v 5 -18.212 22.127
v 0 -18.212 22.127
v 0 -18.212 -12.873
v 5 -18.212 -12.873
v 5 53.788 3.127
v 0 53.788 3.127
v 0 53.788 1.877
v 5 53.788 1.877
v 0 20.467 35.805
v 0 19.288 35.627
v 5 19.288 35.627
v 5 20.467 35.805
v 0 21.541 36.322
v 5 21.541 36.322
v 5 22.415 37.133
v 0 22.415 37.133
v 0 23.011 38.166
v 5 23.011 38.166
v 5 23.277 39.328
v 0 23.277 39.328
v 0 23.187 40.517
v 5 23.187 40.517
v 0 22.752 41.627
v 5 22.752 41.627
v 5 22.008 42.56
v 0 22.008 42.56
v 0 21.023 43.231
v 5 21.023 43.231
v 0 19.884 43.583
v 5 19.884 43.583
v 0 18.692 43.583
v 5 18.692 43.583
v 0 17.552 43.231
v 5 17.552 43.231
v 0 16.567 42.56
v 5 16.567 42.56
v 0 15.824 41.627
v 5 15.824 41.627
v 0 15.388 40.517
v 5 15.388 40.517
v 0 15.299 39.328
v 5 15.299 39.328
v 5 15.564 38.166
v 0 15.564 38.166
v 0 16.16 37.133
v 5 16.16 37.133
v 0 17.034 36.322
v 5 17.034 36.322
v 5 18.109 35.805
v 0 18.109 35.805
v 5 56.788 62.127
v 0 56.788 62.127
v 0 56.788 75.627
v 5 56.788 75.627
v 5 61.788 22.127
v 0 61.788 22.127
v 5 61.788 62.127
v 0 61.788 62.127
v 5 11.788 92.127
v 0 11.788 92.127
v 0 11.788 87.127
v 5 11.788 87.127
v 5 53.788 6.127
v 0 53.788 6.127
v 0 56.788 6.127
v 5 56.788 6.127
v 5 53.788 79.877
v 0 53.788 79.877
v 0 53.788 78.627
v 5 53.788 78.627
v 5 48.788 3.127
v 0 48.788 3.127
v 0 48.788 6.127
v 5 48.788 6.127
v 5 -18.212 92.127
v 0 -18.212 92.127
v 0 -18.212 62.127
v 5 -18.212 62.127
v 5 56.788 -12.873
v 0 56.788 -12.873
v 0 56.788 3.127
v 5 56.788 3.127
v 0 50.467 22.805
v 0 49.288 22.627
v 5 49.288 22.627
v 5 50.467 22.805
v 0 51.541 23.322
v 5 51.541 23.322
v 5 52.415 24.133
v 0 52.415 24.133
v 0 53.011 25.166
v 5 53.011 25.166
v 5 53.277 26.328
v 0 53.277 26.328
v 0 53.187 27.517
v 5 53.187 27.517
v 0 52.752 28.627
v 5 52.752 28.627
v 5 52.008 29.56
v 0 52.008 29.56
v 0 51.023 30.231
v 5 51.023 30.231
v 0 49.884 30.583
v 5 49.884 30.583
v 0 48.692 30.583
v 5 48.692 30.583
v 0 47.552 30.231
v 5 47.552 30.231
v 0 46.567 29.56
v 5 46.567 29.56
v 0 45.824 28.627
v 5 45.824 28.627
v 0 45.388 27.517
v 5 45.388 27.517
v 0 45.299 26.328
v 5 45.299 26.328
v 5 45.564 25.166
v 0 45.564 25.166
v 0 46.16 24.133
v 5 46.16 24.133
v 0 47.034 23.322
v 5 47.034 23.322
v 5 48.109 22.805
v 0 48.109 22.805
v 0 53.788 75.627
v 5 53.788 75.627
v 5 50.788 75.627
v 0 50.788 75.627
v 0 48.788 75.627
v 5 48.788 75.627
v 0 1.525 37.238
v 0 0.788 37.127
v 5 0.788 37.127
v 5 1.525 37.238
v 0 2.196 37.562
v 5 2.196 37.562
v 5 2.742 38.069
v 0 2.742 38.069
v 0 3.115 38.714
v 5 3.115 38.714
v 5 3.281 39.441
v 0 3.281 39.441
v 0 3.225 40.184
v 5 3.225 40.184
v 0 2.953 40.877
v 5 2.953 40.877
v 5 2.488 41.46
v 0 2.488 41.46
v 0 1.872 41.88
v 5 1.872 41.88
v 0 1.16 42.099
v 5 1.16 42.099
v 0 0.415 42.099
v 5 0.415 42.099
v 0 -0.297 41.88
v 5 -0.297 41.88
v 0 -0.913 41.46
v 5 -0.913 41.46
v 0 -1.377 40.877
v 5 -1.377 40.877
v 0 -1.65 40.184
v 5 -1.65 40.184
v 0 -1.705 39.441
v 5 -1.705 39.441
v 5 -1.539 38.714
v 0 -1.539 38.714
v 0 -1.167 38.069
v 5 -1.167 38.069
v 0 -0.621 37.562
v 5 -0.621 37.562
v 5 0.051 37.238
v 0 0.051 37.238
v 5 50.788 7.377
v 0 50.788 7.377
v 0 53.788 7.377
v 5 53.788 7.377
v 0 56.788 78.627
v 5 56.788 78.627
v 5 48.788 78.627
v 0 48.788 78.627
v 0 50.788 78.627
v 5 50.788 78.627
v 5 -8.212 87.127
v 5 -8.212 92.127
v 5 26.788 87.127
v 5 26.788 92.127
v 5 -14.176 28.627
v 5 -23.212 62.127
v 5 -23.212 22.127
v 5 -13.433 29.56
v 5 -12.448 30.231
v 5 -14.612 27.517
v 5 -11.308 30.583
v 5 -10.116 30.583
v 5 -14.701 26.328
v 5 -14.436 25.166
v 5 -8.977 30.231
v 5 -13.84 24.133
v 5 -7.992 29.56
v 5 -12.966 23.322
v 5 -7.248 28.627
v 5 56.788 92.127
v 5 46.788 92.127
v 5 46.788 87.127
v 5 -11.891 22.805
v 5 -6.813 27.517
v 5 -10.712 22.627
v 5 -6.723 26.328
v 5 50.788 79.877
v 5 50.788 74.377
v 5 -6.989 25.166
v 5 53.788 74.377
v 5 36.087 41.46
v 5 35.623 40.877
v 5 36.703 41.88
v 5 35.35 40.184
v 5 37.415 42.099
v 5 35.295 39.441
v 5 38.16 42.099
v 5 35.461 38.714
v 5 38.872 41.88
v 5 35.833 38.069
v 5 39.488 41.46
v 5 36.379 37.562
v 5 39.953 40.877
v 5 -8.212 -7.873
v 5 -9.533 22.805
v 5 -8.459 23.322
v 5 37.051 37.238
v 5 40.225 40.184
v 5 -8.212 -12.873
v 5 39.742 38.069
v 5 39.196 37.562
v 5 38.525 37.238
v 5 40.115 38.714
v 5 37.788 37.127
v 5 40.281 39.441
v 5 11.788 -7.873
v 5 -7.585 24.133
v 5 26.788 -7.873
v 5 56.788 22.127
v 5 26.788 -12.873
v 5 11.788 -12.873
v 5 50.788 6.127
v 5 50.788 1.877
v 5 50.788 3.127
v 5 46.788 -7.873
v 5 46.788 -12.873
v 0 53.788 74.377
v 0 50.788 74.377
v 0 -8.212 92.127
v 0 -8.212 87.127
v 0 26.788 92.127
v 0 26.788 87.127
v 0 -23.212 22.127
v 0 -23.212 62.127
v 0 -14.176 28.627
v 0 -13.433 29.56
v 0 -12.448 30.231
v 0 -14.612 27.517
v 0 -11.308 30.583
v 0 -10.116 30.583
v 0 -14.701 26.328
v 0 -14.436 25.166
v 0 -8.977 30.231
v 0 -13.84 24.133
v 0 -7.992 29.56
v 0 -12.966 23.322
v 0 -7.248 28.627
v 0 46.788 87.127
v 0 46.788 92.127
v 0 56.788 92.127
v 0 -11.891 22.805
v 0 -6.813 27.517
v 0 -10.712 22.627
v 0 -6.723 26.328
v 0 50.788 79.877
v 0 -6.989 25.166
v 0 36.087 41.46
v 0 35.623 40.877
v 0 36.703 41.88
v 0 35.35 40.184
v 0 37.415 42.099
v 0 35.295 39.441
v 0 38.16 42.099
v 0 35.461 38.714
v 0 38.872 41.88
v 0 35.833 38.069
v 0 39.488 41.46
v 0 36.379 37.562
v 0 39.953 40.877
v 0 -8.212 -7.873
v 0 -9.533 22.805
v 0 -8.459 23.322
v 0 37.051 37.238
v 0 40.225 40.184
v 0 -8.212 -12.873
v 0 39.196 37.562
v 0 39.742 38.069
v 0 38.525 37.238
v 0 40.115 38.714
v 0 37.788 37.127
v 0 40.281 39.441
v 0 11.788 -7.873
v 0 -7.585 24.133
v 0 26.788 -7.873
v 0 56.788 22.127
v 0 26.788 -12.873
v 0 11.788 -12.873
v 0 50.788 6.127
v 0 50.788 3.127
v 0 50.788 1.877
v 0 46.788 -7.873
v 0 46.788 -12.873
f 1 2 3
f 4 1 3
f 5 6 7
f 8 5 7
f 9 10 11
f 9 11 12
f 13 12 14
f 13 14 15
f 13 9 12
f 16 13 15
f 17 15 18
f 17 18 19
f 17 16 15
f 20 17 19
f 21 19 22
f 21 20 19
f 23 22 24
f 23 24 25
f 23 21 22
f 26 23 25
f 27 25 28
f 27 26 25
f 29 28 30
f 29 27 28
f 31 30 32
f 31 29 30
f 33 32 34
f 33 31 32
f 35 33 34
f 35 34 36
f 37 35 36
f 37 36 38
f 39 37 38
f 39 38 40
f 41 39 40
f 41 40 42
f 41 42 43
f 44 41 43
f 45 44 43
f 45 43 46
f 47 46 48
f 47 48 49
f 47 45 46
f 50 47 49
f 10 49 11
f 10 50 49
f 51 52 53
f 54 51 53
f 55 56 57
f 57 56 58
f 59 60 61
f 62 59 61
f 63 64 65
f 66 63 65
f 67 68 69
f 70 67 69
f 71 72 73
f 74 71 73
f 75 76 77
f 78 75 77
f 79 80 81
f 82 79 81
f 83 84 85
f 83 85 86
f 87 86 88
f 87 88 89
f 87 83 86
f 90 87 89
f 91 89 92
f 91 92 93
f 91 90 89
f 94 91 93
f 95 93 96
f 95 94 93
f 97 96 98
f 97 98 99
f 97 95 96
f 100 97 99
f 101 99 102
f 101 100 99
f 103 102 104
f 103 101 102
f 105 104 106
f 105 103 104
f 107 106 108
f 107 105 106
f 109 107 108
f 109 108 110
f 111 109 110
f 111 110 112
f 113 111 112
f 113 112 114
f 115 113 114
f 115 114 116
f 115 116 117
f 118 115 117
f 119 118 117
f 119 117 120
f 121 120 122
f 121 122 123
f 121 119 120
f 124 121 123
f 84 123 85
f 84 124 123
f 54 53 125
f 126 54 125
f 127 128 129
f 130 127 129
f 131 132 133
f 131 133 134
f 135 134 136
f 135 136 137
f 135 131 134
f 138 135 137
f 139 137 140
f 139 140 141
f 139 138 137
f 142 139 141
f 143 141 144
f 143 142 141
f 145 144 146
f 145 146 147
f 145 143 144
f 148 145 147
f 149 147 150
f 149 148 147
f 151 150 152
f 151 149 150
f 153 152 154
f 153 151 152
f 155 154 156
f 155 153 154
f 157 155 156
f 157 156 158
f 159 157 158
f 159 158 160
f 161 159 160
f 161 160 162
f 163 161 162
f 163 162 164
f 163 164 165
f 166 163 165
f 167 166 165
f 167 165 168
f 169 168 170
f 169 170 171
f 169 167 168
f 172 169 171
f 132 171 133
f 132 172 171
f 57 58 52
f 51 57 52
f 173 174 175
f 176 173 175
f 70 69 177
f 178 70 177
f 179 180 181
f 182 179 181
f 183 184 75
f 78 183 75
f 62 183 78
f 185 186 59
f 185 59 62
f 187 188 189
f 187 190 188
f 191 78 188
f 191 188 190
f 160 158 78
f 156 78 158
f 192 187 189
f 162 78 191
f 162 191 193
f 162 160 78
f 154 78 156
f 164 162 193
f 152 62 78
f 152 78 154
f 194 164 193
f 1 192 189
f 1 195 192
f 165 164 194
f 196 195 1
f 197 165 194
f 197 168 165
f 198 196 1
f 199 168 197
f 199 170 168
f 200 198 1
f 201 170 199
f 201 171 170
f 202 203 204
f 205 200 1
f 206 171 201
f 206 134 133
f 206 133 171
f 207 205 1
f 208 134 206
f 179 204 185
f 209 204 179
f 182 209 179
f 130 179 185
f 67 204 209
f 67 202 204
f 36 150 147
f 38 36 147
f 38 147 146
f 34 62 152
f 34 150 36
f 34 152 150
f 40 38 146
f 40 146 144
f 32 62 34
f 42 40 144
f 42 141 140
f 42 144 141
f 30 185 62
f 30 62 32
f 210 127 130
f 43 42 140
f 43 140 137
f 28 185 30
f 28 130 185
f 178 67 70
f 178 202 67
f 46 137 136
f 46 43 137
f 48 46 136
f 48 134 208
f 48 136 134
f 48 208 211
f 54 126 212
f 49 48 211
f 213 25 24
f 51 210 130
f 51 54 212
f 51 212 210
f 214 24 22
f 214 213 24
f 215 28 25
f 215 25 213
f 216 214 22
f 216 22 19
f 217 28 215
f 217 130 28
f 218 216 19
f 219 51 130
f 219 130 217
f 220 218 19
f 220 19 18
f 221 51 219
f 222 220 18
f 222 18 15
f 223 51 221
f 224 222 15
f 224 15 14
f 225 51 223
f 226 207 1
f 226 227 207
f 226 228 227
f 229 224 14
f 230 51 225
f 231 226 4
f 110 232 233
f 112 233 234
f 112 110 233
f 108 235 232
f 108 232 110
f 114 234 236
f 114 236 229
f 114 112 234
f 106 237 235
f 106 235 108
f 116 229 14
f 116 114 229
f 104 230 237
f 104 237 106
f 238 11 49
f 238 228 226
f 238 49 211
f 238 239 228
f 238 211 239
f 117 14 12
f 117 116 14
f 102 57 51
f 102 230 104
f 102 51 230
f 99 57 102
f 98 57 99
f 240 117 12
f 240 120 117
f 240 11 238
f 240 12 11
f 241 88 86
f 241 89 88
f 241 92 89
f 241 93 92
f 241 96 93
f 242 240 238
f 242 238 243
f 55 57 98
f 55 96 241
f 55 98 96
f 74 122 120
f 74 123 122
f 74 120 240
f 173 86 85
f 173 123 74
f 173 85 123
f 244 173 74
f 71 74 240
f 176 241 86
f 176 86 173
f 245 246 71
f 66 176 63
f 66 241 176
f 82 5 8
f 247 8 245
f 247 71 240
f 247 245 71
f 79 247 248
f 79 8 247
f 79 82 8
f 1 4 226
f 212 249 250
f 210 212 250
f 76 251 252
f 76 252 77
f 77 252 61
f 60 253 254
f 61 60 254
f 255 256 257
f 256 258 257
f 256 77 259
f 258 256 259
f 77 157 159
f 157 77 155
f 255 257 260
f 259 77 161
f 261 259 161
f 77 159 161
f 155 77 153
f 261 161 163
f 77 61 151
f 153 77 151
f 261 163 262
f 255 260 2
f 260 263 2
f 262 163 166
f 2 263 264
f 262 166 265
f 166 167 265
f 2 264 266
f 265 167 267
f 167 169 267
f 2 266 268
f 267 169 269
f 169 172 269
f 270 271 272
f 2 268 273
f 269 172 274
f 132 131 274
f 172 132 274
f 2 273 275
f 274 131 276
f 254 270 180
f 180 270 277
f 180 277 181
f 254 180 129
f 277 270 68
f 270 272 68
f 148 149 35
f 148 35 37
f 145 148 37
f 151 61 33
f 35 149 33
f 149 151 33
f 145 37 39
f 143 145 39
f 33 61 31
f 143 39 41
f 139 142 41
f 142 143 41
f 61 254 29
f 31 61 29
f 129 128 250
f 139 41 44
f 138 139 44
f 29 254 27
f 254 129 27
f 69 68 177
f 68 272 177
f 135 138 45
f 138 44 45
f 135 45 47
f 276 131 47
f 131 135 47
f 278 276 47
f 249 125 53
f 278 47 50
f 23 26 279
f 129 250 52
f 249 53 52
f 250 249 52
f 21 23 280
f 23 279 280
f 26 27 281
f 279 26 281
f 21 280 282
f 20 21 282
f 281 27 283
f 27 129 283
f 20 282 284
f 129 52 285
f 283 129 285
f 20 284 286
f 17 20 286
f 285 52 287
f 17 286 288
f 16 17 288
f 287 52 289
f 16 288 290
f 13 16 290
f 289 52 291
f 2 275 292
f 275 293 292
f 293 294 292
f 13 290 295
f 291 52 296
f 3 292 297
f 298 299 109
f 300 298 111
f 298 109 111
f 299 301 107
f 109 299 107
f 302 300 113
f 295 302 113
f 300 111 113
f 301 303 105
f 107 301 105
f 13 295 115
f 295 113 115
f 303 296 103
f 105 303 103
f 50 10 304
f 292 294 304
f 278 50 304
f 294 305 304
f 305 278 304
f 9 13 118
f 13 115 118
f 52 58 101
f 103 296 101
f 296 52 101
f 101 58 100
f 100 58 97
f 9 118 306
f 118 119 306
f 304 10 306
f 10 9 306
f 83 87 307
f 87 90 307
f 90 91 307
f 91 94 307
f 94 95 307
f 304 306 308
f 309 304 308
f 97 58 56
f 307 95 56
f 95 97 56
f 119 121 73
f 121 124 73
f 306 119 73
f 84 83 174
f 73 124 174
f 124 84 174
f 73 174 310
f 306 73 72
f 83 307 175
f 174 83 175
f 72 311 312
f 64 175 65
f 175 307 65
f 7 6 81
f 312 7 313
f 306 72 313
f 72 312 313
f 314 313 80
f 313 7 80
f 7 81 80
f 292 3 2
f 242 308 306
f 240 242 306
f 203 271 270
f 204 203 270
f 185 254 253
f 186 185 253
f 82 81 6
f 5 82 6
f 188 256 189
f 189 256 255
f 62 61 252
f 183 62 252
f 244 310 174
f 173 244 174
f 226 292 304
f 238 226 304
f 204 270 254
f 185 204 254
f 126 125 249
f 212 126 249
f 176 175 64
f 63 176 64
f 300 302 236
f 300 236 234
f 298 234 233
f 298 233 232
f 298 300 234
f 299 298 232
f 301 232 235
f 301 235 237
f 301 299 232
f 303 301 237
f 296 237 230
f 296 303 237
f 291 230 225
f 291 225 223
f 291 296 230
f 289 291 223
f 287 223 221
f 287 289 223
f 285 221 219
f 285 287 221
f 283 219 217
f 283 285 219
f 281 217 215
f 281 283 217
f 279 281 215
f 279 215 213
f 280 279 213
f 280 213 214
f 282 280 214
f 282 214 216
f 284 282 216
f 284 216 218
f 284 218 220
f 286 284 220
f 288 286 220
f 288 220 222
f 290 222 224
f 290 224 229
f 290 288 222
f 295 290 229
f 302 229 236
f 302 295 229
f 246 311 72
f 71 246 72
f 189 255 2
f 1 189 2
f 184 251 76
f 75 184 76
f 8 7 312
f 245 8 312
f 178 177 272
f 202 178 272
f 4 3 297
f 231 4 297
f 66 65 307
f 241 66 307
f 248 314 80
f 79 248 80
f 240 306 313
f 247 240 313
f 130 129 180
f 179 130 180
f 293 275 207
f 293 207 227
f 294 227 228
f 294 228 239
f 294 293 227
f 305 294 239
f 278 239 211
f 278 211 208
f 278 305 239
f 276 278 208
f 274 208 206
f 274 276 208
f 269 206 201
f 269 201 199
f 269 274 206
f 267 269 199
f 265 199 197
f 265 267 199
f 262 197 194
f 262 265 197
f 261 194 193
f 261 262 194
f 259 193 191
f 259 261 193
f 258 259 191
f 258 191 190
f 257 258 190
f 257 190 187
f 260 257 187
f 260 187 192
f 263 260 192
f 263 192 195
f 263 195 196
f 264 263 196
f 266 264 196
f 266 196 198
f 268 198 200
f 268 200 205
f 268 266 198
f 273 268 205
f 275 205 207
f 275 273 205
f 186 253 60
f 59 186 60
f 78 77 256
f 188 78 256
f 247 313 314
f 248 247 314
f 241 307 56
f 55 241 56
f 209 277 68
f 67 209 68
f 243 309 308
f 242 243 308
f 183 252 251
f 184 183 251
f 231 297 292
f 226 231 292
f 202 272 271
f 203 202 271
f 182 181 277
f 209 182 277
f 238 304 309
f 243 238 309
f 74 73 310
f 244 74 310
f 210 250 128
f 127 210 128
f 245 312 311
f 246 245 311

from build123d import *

# Parameters (mm, degrees)
SKETCH_1_R      = 4
SKETCH_1_R_2    = 2.5
EXTRUDE_1_DEPTH = 5


with BuildPart() as part:
    # 草图1 → 凸台-拉伸1 (new body)
    with BuildSketch(Plane(origin=(0, 0, 0), x_dir=(0, 0, -1), z_dir=(1, 0, 0))):
        Polygon((-62.127361451, 56.787762609), (-75.627361451, 56.787762609), (-75.627361451, 53.787762609), (-74.377361451, 53.787762609), (-74.377361451, 50.787762609), (-75.627361451, 50.787762609), (-75.627361451, 48.787762609), (-78.627361451, 48.787762609), (-78.627361451, 50.787762609), (-79.877361451, 50.787762609), (-79.877361451, 53.787762609), (-78.627361451, 53.787762609), (-78.627361451, 56.787762609), (-92.127361451, 56.787762609), (-92.127361451, 46.787762609), (-87.127361451, 46.787762609), (-87.127361451, 26.787762609), (-92.127361451, 26.787762609), (-92.127361451, 11.787762609), (-87.127361451, 11.787762609), (-87.127361451, -8.212237391), (-92.127361451, -8.212237391), (-92.127361451, -18.212237391), (-62.127361451, -18.212237391), (-62.127361451, -23.212237391), (-22.127361451, -23.212237391), (-22.127361451, -18.212237391), (12.872638549, -18.212237391), (12.872638549, -8.212237391), (7.872638549, -8.212237391), (7.872638549, 11.787762609), (12.872638549, 11.787762609), (12.872638549, 26.787762609), (7.872638549, 26.787762609), (7.872638549, 46.787762609), (12.872638549, 46.787762609), (12.872638549, 56.787762609), (-3.127361451, 56.787762609), (-3.127361451, 53.787762609), (-1.877361451, 53.787762609), (-1.877361451, 50.787762609), (-3.127361451, 50.787762609), (-3.127361451, 48.787762609), (-6.127361451, 48.787762609), (-6.127361451, 50.787762609), (-7.377361451, 50.787762609), (-7.377361451, 53.787762609), (-6.127361451, 53.787762609), (-6.127361451, 56.787762609), (-22.127361451, 56.787762609), (-22.127361451, 61.787762609), (-62.127361451, 61.787762609), align=None)
        with Locations((-39.627361451, 19.287762609)):
            Circle(SKETCH_1_R, mode=Mode.SUBTRACT)
        with Locations((-39.627361451, 37.787762609)):
            Circle(SKETCH_1_R_2, mode=Mode.SUBTRACT)
        with Locations((-39.627361451, 0.787762609)):
            Circle(SKETCH_1_R_2, mode=Mode.SUBTRACT)
        with Locations((-26.627361451, 49.287762609)):
            Circle(SKETCH_1_R, mode=Mode.SUBTRACT)
        with Locations((-26.627361451, -10.712237391)):
            Circle(SKETCH_1_R, mode=Mode.SUBTRACT)
    extrude(amount=EXTRUDE_1_DEPTH)


solid = part.part
